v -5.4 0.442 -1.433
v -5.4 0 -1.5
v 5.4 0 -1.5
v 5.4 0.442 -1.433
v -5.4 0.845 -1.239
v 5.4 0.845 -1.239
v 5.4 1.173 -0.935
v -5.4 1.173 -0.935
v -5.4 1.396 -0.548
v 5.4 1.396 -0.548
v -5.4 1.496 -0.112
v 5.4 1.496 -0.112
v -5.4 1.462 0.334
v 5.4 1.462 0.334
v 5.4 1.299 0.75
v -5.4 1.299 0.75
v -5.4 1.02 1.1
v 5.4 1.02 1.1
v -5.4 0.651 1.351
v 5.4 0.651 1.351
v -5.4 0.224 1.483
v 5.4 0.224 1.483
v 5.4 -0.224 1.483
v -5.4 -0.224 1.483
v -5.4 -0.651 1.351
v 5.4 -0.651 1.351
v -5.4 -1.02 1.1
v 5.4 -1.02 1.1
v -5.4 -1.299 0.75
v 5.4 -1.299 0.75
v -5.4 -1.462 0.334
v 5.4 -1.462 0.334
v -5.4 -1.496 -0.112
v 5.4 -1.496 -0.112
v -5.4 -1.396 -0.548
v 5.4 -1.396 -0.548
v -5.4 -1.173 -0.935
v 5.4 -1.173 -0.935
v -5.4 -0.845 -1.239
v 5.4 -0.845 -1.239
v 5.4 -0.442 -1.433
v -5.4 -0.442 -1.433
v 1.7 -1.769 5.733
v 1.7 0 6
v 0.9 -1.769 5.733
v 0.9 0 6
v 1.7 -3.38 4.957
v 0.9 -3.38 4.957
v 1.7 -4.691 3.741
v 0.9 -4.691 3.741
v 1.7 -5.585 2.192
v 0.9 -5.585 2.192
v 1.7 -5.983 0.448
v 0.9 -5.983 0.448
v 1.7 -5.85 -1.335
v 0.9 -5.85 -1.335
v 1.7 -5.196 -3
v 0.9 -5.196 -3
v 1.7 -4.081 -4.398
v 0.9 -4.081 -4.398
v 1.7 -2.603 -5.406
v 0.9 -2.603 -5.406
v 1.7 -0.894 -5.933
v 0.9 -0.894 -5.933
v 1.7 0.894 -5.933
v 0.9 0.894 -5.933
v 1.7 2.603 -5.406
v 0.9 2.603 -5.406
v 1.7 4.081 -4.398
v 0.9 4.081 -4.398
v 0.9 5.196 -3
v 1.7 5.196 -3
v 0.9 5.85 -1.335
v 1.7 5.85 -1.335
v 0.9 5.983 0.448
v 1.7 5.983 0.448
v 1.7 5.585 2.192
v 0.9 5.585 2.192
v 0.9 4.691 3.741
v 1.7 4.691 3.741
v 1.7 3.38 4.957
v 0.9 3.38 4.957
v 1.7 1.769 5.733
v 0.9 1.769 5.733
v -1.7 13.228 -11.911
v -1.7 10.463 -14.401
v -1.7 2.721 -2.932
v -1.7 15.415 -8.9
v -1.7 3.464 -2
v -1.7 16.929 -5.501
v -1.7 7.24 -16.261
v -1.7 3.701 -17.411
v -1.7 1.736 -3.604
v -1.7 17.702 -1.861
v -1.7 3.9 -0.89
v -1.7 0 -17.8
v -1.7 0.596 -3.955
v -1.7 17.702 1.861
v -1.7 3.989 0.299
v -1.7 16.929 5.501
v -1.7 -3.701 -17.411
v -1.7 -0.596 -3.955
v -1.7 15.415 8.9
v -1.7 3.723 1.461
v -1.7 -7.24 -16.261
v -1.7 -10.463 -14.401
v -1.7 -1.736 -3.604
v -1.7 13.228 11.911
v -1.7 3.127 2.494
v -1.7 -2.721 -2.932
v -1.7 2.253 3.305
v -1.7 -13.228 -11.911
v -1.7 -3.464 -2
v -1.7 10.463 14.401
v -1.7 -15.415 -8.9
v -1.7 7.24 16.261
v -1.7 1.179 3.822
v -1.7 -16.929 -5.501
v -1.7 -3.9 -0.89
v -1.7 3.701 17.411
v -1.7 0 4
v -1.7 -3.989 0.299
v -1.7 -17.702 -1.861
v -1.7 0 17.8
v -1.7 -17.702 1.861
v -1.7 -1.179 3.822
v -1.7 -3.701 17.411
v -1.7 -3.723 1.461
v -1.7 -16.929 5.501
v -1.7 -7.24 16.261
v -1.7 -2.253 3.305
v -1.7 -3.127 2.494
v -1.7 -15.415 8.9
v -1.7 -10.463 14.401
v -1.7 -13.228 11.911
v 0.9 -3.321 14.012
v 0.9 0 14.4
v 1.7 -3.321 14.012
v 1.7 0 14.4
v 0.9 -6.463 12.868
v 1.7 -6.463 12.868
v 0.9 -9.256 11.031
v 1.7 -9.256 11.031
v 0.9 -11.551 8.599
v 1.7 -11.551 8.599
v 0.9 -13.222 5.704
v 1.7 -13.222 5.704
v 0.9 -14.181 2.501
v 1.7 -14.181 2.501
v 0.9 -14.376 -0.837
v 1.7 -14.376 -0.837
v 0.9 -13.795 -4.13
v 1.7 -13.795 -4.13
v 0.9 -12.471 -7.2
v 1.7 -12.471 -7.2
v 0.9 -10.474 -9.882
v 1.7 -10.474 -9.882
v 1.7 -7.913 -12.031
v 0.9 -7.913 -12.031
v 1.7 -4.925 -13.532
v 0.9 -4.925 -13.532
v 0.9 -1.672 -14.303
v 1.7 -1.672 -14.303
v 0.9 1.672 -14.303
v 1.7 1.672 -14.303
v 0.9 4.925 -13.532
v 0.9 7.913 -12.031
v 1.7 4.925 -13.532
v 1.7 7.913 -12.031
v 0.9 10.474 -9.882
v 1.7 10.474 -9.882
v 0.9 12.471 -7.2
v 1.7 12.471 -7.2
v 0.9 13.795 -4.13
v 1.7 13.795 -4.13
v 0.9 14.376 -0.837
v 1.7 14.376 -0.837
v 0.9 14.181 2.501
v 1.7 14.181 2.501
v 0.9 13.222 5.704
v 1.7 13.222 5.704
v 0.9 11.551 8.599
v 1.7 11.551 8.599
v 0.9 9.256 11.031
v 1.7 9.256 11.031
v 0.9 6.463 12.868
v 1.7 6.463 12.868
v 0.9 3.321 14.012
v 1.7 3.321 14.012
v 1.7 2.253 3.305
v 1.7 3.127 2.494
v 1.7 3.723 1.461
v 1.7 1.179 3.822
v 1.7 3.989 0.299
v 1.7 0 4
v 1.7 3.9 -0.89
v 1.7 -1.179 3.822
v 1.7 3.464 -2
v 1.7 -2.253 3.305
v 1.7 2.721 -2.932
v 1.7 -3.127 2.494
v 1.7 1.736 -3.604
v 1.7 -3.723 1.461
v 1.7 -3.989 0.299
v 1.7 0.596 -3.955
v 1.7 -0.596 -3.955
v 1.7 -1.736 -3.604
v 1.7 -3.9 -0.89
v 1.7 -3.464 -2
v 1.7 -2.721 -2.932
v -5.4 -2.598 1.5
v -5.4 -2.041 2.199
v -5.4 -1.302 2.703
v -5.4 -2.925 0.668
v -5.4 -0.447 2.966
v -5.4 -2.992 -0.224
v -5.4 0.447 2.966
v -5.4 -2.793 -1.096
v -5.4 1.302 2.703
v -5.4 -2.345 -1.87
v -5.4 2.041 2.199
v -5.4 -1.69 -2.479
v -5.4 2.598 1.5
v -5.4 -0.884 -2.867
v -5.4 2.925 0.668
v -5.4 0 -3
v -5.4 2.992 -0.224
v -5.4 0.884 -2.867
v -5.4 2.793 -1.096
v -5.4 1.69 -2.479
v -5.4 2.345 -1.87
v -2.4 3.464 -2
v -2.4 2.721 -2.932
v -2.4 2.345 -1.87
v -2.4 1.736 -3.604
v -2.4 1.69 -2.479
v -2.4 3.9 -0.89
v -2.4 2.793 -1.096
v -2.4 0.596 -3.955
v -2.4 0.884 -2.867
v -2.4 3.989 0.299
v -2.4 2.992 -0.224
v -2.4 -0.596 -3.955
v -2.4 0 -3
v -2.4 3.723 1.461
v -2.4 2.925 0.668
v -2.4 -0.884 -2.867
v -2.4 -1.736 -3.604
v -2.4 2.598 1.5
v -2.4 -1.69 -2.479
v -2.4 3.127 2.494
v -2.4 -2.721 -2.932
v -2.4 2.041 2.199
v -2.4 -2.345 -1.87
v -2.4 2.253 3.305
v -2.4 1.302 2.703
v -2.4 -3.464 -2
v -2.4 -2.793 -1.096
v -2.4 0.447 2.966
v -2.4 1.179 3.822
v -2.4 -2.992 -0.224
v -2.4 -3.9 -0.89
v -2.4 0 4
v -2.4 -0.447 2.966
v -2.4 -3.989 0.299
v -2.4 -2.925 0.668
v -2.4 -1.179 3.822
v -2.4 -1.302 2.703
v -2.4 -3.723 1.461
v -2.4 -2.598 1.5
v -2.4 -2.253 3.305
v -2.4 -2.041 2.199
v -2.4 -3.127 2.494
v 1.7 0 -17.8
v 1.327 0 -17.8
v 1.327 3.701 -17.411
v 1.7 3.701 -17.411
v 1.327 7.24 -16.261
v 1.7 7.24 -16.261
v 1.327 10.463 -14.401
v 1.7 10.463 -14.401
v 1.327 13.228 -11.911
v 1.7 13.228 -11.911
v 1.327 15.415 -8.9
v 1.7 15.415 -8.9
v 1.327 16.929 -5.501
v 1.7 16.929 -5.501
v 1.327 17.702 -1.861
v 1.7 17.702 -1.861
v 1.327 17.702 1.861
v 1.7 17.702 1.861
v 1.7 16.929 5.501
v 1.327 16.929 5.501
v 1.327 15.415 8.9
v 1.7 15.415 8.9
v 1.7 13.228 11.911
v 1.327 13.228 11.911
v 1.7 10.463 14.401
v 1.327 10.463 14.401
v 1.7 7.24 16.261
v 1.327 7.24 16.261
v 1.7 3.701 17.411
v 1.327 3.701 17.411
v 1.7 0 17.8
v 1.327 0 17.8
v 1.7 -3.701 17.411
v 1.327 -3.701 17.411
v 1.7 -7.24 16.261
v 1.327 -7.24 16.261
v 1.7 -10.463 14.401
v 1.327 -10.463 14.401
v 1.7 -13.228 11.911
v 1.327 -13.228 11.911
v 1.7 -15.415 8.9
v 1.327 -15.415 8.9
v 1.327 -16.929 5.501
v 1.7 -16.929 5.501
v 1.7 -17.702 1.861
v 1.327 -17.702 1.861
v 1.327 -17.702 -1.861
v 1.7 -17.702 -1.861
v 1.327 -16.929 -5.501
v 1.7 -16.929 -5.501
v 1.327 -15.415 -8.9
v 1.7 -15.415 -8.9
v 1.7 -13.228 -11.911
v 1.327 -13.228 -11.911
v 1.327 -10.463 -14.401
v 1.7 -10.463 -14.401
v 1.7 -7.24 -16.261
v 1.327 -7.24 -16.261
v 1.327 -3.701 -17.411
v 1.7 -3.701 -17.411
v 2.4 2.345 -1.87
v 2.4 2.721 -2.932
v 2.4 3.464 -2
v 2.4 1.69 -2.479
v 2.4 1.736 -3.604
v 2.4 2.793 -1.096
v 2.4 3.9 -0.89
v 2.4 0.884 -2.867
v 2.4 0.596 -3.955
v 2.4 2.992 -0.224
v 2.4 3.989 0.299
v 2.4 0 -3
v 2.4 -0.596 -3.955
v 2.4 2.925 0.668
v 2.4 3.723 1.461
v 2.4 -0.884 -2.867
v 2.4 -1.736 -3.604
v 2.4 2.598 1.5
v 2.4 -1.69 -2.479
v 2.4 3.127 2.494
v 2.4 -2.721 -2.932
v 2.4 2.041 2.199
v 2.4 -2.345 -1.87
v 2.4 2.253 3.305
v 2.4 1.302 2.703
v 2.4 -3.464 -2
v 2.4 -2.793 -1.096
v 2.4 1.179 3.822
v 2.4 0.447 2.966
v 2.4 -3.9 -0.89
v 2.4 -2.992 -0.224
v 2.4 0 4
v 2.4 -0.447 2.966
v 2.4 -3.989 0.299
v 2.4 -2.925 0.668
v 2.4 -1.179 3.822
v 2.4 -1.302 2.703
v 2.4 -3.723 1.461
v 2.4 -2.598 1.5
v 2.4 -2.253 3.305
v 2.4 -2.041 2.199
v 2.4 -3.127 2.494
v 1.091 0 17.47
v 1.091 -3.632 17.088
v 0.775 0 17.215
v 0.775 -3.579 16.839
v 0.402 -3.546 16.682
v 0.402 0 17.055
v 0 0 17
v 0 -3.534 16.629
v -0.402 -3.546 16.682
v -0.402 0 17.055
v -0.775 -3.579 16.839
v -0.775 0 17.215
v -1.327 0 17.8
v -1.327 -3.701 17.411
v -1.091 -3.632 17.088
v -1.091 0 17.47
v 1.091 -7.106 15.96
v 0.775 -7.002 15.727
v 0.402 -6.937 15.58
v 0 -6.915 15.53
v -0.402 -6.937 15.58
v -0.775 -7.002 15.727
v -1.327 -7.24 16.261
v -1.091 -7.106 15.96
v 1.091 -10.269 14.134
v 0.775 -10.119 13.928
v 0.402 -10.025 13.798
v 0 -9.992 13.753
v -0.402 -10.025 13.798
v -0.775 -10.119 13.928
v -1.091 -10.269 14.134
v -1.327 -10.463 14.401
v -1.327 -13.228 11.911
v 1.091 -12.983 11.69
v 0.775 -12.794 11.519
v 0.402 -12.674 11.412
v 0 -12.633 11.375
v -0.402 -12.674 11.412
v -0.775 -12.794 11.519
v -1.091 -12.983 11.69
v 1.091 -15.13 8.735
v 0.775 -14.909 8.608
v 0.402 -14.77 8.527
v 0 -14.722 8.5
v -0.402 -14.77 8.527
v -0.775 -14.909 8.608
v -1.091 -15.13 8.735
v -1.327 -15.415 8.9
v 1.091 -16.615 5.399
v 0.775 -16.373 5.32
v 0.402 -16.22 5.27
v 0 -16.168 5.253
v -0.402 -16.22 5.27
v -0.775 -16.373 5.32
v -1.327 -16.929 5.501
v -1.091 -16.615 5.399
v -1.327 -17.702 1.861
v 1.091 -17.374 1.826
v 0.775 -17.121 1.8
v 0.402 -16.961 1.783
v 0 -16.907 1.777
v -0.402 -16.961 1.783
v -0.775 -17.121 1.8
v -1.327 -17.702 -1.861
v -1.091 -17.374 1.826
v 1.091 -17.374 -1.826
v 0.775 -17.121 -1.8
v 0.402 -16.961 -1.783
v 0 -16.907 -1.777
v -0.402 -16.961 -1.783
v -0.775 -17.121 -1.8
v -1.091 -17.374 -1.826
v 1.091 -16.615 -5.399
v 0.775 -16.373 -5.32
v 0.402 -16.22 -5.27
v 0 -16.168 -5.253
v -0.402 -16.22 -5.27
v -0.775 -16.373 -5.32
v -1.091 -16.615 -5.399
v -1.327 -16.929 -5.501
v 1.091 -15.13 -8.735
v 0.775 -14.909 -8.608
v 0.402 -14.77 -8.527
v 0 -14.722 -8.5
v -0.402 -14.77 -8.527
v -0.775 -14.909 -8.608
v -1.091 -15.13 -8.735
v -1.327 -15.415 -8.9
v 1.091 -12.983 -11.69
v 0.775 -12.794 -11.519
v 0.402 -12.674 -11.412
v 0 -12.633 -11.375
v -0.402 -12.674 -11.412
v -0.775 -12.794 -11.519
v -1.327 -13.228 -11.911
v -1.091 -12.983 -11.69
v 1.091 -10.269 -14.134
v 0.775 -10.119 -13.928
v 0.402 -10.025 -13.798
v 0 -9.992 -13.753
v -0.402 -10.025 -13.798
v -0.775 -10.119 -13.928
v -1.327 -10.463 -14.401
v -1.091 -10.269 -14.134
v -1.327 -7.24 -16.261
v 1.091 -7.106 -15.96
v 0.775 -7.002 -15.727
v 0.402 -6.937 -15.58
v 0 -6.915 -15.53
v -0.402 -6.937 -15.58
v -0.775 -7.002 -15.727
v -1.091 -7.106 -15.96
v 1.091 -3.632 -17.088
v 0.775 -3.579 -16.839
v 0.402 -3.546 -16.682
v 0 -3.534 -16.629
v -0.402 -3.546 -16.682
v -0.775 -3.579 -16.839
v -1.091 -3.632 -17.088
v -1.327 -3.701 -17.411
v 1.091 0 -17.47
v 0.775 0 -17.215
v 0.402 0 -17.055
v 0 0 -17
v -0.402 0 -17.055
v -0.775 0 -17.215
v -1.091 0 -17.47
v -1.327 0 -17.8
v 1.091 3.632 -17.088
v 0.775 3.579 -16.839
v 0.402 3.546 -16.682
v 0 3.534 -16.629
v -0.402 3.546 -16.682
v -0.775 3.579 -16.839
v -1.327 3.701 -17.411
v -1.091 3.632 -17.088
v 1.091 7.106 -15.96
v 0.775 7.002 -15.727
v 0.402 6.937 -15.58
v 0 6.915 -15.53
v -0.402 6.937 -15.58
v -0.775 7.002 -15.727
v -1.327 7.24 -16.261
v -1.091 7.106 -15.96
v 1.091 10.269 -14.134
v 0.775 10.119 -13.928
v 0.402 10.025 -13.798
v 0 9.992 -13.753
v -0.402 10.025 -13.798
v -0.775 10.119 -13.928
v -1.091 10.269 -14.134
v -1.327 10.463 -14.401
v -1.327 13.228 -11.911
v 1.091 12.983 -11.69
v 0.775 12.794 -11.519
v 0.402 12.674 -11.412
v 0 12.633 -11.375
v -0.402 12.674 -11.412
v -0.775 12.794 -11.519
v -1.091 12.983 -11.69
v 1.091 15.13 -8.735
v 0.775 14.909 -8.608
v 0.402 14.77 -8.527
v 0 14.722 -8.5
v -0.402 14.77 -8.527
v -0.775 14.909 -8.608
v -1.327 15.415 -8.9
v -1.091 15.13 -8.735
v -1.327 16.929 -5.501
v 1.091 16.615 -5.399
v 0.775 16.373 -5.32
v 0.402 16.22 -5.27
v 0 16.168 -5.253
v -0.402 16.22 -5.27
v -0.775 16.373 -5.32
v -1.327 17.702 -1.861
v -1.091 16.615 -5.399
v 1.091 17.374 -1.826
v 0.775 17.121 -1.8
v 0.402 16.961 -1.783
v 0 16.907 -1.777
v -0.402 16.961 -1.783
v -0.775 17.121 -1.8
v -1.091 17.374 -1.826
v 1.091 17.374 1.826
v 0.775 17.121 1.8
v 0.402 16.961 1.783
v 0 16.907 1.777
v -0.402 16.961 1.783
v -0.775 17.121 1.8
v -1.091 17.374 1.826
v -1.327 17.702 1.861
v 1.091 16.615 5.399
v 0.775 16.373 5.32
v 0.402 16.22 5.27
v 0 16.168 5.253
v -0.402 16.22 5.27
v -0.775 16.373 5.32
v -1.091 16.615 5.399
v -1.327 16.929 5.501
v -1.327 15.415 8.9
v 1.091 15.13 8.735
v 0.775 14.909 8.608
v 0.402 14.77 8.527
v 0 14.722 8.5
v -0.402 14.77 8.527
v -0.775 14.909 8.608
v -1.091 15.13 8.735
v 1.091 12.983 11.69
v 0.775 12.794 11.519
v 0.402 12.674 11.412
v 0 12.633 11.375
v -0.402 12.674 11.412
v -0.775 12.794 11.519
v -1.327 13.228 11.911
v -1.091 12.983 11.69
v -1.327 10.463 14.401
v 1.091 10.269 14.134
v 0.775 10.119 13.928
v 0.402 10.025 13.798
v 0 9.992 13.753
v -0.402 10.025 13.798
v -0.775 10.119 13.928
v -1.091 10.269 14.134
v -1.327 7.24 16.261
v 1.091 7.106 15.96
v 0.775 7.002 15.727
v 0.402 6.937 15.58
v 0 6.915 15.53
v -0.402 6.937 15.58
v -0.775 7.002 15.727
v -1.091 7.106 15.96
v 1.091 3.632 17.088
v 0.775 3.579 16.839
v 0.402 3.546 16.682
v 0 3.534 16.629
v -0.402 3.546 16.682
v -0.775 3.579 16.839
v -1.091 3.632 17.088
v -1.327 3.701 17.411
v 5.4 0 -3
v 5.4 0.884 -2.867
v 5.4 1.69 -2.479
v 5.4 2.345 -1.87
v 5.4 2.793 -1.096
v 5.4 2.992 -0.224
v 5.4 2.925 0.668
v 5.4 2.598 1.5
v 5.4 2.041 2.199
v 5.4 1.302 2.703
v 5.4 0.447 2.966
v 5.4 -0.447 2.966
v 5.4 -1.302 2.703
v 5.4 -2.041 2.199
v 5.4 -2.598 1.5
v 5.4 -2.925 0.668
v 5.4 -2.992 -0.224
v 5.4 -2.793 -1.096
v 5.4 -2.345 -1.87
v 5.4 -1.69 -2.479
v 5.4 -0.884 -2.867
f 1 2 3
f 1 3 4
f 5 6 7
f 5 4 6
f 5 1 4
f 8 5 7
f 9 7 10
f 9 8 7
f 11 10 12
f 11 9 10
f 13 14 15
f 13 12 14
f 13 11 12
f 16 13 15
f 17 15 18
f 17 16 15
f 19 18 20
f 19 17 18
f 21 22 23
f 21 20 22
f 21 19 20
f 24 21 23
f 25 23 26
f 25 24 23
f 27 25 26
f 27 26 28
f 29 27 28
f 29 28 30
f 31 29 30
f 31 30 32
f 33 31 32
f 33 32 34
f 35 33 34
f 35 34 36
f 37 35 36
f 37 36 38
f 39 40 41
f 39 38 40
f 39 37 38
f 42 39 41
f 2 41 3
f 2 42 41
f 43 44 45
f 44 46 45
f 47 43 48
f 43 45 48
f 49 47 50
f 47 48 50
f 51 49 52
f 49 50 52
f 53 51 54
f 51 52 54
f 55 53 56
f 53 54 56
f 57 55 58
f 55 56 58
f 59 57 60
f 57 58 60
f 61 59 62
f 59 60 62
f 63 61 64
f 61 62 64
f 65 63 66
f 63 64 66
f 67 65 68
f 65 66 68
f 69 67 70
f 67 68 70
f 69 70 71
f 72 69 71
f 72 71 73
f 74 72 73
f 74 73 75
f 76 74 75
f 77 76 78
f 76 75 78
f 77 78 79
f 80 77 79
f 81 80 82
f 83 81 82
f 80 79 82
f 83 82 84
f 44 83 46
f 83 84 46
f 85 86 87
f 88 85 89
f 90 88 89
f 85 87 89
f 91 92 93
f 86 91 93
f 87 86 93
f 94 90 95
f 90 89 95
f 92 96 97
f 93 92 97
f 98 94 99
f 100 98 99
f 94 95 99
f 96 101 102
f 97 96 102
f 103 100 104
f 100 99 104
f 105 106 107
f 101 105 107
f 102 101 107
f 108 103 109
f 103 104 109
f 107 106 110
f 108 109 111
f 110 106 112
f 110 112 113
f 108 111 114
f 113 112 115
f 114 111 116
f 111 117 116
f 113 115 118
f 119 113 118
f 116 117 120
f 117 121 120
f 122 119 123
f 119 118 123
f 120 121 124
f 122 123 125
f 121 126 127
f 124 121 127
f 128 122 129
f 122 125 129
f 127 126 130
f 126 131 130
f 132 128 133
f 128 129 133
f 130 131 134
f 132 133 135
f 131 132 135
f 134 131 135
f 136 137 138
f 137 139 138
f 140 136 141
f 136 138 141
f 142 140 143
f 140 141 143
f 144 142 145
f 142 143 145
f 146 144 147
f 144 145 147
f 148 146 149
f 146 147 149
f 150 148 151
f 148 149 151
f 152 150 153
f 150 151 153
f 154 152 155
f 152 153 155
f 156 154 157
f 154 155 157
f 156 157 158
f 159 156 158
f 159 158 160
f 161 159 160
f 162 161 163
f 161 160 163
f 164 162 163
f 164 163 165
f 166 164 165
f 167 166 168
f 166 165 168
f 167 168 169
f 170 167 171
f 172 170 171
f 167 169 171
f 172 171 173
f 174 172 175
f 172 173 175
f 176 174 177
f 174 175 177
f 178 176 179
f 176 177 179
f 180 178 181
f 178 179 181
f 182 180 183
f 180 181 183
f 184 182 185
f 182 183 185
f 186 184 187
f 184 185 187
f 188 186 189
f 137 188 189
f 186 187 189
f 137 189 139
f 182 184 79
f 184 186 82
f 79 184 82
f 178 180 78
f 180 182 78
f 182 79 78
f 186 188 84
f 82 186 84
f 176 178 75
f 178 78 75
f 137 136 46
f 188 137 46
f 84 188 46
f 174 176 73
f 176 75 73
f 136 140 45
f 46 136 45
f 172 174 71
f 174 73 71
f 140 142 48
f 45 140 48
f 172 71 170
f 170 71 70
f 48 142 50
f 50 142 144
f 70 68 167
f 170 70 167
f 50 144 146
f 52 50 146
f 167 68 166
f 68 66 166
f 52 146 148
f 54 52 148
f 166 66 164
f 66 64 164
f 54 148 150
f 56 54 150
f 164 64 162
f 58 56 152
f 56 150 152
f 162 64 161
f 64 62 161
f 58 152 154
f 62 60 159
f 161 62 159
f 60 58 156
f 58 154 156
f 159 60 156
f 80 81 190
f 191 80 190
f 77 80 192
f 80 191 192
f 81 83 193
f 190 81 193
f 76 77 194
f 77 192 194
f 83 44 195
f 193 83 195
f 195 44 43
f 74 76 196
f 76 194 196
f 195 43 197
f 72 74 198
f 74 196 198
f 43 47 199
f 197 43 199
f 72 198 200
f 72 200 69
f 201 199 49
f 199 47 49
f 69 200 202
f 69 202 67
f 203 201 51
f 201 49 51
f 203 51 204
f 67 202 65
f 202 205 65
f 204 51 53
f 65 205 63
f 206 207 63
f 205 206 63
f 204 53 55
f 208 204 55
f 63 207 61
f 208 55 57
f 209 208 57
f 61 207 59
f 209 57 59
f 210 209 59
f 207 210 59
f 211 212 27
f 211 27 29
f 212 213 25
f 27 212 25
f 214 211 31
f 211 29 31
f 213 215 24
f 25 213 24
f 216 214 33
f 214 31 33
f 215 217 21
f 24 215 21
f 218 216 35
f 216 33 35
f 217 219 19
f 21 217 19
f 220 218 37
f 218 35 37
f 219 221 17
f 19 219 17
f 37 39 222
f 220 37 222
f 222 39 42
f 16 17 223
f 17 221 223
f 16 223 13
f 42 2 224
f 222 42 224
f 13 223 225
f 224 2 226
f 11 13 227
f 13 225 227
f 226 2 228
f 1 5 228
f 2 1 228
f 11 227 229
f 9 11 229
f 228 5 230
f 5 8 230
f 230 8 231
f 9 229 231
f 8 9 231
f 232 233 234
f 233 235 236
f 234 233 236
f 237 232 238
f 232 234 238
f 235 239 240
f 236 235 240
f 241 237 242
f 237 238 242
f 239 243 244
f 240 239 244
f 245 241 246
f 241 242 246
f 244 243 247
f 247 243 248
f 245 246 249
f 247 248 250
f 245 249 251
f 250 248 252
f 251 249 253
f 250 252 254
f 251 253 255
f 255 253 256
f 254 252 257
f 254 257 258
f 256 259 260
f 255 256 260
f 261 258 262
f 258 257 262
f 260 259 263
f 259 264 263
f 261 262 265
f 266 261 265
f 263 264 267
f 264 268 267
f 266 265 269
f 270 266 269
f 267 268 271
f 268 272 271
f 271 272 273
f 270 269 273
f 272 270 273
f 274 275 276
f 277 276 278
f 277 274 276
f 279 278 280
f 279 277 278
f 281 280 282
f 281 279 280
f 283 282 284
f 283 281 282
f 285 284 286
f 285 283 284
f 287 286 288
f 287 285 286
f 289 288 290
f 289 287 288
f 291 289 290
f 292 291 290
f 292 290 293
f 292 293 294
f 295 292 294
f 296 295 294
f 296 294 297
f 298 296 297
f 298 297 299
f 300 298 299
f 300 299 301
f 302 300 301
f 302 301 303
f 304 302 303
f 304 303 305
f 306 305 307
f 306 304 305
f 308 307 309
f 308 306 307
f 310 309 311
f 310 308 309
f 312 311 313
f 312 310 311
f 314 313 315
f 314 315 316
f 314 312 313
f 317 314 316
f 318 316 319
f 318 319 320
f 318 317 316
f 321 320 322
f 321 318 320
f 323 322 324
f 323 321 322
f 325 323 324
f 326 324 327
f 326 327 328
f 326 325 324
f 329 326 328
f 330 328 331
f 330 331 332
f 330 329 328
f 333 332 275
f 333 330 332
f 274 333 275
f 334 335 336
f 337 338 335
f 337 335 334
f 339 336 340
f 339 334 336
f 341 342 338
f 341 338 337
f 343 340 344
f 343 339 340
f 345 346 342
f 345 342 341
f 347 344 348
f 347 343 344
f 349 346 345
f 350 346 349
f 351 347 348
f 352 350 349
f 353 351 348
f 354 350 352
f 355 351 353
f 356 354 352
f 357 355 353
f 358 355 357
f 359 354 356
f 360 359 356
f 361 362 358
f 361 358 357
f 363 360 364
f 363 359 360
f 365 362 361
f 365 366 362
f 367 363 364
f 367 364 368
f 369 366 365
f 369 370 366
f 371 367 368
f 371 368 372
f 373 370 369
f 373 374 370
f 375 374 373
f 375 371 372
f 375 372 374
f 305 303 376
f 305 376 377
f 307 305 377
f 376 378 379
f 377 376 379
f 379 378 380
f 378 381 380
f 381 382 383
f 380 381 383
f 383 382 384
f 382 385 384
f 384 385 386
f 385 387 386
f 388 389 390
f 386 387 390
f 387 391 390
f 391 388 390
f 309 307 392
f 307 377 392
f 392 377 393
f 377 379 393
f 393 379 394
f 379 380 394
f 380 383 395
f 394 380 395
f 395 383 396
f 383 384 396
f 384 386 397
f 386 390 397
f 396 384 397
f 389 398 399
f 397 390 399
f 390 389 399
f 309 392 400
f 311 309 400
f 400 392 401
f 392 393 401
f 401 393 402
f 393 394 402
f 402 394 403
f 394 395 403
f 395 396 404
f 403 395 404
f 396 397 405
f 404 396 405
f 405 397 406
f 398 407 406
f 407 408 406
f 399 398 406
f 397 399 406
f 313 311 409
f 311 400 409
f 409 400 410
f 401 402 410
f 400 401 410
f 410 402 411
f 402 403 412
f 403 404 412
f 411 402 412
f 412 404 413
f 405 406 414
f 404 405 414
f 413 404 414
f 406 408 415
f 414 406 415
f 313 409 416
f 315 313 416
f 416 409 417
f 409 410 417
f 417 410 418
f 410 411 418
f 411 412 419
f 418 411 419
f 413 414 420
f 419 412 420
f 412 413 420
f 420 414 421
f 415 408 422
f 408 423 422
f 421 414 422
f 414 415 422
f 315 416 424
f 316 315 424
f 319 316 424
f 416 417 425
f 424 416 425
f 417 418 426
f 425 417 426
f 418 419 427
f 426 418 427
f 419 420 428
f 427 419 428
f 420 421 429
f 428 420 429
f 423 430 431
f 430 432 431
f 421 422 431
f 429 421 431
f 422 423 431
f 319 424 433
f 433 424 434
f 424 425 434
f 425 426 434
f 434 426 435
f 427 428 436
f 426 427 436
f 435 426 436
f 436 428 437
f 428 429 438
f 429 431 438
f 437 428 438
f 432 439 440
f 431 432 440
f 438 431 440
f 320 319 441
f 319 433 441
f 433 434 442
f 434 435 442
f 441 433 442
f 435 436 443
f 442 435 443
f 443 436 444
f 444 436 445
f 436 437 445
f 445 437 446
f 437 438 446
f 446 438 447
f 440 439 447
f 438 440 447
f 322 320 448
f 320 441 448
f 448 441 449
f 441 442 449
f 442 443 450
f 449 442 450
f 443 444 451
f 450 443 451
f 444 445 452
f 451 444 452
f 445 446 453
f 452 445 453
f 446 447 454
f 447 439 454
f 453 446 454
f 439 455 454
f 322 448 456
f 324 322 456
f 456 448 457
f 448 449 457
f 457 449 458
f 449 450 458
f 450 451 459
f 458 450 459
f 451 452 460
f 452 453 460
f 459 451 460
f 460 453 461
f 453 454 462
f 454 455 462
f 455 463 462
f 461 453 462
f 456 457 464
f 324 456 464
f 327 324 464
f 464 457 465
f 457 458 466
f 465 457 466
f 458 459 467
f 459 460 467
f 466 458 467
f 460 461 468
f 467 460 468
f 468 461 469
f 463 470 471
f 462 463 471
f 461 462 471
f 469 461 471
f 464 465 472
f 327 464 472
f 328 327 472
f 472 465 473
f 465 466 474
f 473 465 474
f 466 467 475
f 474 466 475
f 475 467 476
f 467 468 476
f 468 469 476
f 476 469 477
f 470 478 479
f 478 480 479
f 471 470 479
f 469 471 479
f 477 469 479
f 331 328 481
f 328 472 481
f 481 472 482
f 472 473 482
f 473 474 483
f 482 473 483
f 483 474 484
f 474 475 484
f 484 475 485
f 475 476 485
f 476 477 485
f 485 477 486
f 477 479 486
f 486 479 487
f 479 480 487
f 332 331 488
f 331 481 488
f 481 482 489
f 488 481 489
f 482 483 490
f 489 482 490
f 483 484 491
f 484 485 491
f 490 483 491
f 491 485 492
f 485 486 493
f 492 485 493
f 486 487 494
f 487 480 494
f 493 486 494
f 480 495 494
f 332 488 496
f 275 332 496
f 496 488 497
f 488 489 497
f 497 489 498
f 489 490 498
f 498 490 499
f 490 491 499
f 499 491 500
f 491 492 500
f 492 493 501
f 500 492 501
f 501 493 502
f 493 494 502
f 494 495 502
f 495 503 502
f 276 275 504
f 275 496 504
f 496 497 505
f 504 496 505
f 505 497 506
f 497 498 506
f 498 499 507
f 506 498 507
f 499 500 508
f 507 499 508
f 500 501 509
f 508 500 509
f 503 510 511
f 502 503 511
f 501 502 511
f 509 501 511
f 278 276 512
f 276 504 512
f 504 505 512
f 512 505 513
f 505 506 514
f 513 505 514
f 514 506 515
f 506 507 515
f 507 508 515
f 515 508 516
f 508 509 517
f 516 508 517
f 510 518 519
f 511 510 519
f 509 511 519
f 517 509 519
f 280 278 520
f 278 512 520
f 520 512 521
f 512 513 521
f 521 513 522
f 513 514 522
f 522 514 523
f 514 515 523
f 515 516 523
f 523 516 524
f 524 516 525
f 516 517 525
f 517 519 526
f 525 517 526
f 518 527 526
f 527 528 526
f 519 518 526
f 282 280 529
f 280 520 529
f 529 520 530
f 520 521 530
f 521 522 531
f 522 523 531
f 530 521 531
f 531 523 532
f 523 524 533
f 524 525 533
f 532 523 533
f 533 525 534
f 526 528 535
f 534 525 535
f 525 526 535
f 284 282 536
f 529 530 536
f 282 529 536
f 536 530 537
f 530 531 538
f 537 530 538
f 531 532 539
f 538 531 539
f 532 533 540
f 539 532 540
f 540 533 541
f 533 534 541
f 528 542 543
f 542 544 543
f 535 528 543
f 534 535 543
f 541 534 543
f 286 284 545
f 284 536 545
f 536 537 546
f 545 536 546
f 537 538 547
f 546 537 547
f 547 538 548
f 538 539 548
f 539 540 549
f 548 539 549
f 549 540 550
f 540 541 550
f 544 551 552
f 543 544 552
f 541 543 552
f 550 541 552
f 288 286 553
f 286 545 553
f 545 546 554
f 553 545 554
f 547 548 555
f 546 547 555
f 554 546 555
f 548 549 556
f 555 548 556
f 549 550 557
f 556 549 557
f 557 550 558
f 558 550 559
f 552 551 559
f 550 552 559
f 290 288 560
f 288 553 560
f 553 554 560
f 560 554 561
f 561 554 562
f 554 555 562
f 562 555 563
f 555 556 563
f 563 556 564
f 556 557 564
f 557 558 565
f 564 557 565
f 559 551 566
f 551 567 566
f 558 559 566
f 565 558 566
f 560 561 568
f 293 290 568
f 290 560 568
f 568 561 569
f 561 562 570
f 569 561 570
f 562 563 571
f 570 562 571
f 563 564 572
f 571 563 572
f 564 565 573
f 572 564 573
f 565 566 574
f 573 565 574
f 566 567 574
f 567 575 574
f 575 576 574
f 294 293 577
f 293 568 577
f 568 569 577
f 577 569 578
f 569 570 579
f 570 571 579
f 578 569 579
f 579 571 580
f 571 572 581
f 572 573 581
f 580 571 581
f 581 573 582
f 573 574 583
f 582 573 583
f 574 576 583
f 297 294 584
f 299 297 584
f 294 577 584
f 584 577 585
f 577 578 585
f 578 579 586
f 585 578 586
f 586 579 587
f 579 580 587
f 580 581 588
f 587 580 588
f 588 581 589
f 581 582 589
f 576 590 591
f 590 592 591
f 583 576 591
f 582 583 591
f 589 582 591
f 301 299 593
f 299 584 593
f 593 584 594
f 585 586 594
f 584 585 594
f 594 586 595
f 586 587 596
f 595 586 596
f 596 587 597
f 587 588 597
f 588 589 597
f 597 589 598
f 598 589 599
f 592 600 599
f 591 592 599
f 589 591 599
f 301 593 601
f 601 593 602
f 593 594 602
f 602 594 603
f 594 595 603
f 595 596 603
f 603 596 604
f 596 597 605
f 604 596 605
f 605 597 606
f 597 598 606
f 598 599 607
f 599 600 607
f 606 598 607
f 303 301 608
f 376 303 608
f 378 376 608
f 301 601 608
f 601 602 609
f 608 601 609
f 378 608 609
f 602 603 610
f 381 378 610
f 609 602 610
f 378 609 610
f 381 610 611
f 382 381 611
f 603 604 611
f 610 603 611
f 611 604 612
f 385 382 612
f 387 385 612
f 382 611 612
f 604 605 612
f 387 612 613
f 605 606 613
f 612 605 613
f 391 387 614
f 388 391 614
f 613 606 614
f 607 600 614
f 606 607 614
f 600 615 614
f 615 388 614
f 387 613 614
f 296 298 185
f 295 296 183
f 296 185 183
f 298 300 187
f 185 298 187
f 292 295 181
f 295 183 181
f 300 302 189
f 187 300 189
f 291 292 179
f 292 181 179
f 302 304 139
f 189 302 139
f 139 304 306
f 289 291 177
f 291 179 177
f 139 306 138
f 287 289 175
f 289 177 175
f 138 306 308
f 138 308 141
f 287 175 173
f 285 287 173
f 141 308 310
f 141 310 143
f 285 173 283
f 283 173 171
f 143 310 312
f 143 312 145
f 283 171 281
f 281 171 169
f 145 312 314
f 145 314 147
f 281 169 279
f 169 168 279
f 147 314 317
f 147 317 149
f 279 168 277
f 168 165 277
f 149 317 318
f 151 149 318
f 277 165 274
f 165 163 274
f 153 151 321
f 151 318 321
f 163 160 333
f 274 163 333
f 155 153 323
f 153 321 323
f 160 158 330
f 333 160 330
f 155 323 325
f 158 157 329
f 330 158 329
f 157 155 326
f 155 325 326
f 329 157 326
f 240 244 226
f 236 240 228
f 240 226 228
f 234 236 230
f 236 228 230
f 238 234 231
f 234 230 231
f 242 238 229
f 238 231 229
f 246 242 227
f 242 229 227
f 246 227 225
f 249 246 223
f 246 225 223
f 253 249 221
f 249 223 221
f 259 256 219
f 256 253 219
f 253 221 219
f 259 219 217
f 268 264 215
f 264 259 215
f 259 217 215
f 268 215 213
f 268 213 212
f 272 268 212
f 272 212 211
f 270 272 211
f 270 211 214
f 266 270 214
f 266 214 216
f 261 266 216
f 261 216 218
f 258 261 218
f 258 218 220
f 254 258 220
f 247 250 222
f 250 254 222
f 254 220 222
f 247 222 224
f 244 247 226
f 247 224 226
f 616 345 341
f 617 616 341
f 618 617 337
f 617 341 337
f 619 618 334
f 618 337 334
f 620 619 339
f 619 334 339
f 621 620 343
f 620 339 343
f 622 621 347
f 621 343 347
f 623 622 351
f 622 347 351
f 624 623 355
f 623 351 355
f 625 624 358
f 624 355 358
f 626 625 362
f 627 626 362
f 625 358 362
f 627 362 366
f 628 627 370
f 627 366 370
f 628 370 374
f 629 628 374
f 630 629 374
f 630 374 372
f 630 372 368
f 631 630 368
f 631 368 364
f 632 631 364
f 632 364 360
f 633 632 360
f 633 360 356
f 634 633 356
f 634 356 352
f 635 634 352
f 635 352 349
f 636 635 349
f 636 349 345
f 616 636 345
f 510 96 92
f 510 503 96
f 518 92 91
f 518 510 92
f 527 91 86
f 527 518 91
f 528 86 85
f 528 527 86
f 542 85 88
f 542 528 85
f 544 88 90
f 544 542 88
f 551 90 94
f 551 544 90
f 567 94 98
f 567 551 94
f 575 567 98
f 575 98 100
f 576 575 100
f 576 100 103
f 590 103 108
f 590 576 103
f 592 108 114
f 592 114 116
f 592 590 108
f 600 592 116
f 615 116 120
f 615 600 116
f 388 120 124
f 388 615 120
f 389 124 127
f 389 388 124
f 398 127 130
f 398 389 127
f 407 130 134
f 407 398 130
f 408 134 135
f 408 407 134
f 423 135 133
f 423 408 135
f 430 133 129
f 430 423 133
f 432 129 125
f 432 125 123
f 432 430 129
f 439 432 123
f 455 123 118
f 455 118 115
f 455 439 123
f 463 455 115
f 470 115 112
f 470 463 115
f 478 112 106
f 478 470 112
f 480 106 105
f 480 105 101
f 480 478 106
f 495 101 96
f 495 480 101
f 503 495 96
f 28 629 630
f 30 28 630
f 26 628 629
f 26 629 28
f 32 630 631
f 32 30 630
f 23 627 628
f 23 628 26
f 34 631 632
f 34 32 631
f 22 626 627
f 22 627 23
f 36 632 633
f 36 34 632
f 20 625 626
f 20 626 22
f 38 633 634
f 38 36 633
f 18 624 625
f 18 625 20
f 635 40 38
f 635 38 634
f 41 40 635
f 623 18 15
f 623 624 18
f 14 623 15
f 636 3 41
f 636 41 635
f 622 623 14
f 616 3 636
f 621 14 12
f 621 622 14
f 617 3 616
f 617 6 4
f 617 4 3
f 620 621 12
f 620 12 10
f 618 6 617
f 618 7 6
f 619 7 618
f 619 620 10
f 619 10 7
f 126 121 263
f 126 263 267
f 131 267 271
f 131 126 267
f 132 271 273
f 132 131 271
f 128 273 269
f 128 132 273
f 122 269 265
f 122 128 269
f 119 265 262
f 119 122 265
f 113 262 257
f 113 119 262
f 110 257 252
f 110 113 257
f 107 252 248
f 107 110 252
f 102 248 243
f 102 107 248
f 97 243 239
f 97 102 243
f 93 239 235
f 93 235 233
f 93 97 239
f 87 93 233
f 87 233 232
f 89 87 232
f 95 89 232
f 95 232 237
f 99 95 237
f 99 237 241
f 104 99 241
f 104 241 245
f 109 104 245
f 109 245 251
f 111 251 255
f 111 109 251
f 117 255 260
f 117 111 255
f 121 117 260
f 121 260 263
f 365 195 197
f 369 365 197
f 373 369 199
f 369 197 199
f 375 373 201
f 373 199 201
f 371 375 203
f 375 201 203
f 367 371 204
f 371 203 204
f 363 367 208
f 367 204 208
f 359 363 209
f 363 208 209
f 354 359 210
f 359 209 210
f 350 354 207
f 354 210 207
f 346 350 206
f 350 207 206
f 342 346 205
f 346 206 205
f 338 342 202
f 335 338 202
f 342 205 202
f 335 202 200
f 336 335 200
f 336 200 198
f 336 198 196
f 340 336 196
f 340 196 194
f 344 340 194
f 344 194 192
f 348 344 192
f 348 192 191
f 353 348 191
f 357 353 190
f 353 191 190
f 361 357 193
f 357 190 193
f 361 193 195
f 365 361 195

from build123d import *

# Parameters (mm, degrees)
AXE_DEPTH                   = 5.4
AXE_DEPTH_BACK              = 5.4
ESQUISSE4_R                 = 3
ESQUISSE6_R                 = 4
EMPAULEMENT_ROULEMENT_DEPTH = 0.7
AXE_3MM_DEPTH               = 27.714415584
AXE_3MM_DEPTH_BACK          = 27.714415584
ESQUISSE5_R                 = 1.5
ESQUISSE7_W                 = 4.96410879
ESQUISSE7_H                 = 0.7


with BuildPart() as part:
    # Esquisse2 → Révolution1 (revolve)
    with BuildSketch(Plane.XY, mode=Mode.PRIVATE) as r_volution1_sk:
        with BuildLine():
            ThreePointArc((1.5, 18.5), (0, 17), (-1.5, 18.5))
            Line((-1.5, 18.5), (-1.7, 18.5))
            Line((-1.7, 18.5), (-1.7, 0))
            Line((-1.7, 0), (1.7, 0))
            Line((1.7, 0), (1.7, 6))
            Line((1.7, 6), (0.9, 6))
            Line((0.9, 6), (0.9, 14.4))
            Line((0.9, 14.4), (1.7, 14.4))
            Line((1.7, 14.4), (1.7, 18.5))
            Line((1.7, 18.5), (1.5, 18.5))
        make_face()
    revolve(r_volution1_sk.sketch.rotate(Axis((-1.7, 0, 0), (1, 0, 0)), 90), axis=Axis((-1.7, 0, 0), (1, 0, 0)))

    # Esquisse4 → axe (add, two sides: drawn at the far end of the back side and taken through both)
    with BuildSketch(Plane(origin=(0, 0, 0), x_dir=(0, 0, -1), z_dir=(1, 0, 0)).offset(-AXE_DEPTH_BACK)):
        Circle(ESQUISSE4_R)
    extrude(amount=AXE_DEPTH + AXE_DEPTH_BACK)

    # Esquisse6 → empaulement_roulement (add)
    with BuildSketch(Plane(origin=(1.7, 0, 0), x_dir=(0, 0, -1), z_dir=(1, 0, 0))):
        with Locations(Location((0, 0, 0), (0, 0, 180))):
            Circle(ESQUISSE6_R)
    empaulement_roulement = extrude(amount=EMPAULEMENT_ROULEMENT_DEPTH)

    # Symétrie1: empaulement_roulement across plane
    add(empaulement_roulement.mirror(Plane(origin=(0, 0, 0), x_dir=(0, 0, 1), z_dir=(1, 0, 0))))

    # Esquisse5 → axe_3mm (cut, two sides: drawn at the far end of the back side and taken through both)
    with BuildSketch(Plane(origin=(0, 0, 0), x_dir=(0, 0, -1), z_dir=(1, 0, 0)).offset(-AXE_3MM_DEPTH_BACK)):
        Circle(ESQUISSE5_R)
    extrude(amount=AXE_3MM_DEPTH + AXE_3MM_DEPTH_BACK, mode=Mode.SUBTRACT)

    # Esquisse7 → Enlèvement de matière-Révolution1 (revolve, cut)
    with BuildSketch(Plane.XY, mode=Mode.PRIVATE) as enl_vement_de_mati_re_r_volution1_sk:
        with Locations((0, 18.15)):
            Rectangle(ESQUISSE7_W, ESQUISSE7_H)
    revolve(enl_vement_de_mati_re_r_volution1_sk.sketch.rotate(Axis((0, 0, 0), (1, 0, 0)), 270), axis=Axis((0, 0, 0), (1, 0, 0)), mode=Mode.SUBTRACT)


solid = part.part
